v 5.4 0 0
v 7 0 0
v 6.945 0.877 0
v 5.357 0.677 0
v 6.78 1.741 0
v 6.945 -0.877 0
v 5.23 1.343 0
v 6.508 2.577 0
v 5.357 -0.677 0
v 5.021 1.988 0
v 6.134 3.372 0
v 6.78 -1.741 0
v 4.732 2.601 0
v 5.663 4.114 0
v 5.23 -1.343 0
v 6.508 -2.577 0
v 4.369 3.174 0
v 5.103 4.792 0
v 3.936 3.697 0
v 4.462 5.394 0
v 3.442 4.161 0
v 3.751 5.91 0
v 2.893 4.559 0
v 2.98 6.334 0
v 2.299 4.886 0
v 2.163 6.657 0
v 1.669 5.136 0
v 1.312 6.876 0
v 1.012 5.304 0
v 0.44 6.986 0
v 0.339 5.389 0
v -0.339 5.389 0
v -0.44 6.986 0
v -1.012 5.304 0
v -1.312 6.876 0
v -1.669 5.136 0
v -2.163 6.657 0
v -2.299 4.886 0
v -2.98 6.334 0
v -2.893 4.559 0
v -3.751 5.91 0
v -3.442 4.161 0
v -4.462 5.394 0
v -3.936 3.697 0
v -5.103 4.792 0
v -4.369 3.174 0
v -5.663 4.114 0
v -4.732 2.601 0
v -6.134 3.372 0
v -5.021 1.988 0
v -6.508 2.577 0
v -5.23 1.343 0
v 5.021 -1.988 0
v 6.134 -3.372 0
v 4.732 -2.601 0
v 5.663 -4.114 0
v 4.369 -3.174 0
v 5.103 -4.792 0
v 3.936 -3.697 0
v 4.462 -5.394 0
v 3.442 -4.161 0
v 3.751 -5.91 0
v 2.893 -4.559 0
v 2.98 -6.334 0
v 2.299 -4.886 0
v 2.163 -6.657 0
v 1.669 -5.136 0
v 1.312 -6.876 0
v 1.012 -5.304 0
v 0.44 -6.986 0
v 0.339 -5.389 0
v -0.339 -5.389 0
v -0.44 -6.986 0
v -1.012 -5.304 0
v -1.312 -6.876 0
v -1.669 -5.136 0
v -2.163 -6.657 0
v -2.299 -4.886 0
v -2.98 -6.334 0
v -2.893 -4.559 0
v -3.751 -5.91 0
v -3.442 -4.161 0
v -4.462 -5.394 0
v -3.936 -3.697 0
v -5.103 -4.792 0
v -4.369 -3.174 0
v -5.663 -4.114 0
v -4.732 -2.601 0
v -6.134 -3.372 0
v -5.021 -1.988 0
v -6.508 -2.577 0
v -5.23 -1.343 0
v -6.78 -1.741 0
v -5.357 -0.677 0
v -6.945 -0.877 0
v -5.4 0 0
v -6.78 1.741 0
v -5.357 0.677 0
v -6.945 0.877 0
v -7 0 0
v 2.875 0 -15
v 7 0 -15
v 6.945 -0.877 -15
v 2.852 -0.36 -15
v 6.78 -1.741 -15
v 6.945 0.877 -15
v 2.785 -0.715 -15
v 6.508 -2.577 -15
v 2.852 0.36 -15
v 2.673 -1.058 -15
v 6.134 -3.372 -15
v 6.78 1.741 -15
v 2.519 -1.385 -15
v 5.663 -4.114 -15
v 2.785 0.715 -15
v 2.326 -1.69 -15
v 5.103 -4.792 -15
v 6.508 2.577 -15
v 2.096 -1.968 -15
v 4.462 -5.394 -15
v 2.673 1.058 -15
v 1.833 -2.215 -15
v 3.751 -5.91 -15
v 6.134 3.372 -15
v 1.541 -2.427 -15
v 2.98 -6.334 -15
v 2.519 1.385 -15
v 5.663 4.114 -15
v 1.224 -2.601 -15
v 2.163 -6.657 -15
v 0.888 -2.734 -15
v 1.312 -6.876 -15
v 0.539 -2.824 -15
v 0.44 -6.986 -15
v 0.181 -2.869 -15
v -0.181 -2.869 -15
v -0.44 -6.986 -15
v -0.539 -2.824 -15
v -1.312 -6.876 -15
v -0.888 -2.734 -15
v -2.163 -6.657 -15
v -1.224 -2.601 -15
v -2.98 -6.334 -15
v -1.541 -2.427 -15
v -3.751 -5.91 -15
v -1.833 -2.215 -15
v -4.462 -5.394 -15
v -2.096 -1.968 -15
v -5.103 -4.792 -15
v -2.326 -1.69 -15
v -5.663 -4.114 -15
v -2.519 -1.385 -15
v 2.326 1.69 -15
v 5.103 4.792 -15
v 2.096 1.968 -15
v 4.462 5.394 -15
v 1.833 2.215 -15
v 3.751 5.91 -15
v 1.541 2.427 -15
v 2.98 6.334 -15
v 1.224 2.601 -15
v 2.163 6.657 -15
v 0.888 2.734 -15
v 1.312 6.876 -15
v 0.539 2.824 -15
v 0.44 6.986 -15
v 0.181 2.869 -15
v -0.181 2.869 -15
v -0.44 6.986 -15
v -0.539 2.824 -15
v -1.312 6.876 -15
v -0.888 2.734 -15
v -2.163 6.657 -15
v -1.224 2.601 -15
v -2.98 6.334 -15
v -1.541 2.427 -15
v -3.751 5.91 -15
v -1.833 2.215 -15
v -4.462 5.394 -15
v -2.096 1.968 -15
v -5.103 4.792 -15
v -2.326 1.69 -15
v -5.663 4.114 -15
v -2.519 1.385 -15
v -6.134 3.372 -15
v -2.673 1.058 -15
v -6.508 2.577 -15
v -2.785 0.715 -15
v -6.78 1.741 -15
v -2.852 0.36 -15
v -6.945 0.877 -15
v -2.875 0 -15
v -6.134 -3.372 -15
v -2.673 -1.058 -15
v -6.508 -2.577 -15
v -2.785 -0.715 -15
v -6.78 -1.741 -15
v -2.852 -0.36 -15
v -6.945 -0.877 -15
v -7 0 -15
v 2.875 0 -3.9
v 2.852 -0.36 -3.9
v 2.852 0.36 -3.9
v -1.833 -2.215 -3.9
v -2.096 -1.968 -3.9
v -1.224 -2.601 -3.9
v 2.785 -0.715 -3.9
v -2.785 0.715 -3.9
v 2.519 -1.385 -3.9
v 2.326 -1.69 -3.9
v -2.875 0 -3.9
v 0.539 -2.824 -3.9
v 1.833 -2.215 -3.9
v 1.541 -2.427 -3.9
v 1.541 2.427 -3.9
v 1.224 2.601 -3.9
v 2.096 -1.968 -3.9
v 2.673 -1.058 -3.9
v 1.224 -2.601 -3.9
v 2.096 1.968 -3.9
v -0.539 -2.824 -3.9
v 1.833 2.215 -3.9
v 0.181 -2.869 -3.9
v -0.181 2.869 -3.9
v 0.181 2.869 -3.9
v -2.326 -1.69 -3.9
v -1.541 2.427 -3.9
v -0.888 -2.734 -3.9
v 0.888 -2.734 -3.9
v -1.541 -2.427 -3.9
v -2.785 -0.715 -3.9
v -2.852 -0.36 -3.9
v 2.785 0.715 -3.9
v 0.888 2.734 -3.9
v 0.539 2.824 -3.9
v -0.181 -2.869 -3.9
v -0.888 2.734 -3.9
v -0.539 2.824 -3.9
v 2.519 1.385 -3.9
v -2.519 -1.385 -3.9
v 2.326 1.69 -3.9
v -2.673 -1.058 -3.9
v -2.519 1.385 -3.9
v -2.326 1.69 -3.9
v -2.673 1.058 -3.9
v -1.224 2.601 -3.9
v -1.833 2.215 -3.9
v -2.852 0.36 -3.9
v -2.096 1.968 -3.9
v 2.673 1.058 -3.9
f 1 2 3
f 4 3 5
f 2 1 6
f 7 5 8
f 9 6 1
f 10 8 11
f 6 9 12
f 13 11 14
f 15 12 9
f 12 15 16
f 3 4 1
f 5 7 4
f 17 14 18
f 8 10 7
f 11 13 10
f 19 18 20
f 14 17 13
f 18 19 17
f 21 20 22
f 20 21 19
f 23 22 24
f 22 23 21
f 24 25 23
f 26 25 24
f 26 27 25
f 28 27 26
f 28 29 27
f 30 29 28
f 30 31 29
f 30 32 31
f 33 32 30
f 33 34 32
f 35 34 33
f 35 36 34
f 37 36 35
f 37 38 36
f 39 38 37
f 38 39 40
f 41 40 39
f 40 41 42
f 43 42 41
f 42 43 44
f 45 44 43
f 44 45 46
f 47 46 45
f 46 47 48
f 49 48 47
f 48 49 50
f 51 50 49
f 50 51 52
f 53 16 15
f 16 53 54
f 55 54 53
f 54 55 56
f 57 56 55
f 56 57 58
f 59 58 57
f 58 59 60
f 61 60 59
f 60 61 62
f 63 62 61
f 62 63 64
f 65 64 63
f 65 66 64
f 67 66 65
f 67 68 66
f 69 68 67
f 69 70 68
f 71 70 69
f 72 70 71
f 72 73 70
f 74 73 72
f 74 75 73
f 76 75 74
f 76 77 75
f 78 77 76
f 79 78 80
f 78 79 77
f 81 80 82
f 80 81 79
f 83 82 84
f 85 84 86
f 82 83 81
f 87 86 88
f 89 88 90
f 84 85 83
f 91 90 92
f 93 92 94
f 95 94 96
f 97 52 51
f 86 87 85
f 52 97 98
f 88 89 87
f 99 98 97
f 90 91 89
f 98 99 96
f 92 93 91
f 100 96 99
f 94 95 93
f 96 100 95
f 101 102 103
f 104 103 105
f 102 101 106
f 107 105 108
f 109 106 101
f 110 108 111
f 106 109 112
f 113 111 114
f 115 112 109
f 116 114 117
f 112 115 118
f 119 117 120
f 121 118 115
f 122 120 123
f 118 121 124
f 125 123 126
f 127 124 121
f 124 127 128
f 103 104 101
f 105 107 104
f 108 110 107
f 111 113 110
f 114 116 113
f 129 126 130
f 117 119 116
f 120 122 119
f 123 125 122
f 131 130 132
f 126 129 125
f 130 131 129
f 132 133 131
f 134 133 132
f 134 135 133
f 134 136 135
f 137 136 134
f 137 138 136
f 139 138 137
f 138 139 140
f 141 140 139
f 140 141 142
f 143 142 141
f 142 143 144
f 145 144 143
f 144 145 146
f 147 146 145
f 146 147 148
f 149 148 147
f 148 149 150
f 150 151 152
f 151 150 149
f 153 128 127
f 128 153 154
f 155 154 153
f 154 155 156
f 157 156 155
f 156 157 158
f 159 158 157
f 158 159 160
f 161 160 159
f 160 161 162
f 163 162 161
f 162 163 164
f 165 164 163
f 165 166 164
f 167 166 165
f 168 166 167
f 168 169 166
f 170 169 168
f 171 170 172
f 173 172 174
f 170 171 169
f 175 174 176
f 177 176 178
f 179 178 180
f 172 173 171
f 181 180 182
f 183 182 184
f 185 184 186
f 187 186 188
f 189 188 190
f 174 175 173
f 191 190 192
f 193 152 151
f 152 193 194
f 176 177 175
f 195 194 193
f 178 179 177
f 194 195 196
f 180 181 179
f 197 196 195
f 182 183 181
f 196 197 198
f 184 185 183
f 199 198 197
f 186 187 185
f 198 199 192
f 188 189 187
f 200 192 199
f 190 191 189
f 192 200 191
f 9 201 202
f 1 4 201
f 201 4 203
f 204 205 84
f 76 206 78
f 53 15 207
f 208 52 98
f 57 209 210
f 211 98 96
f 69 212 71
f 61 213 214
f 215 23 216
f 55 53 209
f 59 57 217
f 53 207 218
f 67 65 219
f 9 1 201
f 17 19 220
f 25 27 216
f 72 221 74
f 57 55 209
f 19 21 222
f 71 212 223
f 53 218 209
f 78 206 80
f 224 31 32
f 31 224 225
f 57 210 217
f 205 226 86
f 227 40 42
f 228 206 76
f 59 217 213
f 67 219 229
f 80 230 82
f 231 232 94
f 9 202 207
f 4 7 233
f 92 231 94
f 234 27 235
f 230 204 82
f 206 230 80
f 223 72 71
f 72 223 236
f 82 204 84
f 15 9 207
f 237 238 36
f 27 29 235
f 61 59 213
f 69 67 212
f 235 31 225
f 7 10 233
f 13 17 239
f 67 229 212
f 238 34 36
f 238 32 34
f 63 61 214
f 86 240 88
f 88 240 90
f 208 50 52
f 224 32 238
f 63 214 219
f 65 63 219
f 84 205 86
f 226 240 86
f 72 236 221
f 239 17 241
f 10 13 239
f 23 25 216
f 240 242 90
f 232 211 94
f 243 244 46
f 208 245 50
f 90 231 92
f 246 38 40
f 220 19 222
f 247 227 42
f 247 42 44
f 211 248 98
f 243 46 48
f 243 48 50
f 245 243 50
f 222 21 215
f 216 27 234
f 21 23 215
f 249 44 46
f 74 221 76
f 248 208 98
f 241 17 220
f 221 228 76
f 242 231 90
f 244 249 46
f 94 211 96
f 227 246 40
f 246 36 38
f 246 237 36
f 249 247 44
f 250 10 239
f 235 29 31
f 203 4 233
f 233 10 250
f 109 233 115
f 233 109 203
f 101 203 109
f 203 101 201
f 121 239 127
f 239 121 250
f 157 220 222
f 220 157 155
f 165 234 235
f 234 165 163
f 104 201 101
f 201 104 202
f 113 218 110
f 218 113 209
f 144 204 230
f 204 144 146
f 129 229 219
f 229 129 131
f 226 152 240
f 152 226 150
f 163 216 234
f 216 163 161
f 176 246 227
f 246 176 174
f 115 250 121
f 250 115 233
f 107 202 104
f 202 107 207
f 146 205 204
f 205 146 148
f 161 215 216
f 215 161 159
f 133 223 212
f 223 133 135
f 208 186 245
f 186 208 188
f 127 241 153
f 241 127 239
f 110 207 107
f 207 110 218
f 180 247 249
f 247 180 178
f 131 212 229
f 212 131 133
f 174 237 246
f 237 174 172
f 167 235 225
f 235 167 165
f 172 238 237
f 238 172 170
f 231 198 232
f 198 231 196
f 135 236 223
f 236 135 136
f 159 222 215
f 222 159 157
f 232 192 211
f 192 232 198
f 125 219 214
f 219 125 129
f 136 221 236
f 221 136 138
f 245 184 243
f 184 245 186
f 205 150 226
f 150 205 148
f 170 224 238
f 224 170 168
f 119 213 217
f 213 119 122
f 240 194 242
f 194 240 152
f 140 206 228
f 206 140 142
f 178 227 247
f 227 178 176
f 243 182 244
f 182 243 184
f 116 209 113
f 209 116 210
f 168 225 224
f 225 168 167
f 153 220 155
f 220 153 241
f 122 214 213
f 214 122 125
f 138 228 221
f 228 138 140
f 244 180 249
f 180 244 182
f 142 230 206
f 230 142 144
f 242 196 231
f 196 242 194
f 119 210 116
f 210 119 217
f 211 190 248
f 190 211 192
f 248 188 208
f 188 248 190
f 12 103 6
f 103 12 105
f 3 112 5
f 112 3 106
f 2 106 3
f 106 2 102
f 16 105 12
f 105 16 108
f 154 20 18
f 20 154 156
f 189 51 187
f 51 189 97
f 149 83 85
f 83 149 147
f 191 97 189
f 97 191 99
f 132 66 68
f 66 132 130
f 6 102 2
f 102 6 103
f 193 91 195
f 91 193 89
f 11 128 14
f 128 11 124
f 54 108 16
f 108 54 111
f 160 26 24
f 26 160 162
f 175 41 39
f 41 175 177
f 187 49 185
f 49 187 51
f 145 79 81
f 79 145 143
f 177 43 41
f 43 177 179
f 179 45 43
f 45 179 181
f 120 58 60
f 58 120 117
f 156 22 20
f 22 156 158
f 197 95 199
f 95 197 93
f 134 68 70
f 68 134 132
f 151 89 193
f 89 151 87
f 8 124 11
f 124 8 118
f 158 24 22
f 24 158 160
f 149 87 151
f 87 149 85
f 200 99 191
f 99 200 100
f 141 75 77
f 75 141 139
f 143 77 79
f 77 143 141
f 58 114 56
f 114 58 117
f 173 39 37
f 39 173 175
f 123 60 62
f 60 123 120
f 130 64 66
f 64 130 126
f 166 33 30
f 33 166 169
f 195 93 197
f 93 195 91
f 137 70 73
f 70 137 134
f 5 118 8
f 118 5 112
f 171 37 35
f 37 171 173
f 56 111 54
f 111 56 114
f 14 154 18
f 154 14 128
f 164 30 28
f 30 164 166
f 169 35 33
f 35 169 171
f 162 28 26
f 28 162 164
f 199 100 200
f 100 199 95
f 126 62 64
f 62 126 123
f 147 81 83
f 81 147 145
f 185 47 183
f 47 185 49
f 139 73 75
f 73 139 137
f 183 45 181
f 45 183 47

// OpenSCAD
$fn = 50;


difference() {
	union() {
		translate(v = [0, 0, -15.0000000000]) {
			cylinder(h = 15, r = 7.0000000000);
		}
		cylinder(h = 0, r = 10.0000000000);
	}
	union() {
		translate(v = [0, 0, 0]) {
			rotate(a = [0, 0, 0]) {
				difference() {
					union() {
						#translate(v = [0, 0, -15.0000000000]) {
							cylinder(h = 15, r = 2.6000000000);
						}
						#translate(v = [0, 0, -3.9000000000]) {
							cylinder(h = 3.9000000000, r = 7.0000000000, r1 = 2.8750000000, r2 = 5.4000000000);
						}
						#translate(v = [0, 0, -15.0000000000]) {
							cylinder(h = 15, r = 2.8750000000);
						}
						#translate(v = [0, 0, -15.0000000000]) {
							cylinder(h = 15, r = 2.6000000000);
						}
					}
					union();
				}
			}
		}
	}
}
